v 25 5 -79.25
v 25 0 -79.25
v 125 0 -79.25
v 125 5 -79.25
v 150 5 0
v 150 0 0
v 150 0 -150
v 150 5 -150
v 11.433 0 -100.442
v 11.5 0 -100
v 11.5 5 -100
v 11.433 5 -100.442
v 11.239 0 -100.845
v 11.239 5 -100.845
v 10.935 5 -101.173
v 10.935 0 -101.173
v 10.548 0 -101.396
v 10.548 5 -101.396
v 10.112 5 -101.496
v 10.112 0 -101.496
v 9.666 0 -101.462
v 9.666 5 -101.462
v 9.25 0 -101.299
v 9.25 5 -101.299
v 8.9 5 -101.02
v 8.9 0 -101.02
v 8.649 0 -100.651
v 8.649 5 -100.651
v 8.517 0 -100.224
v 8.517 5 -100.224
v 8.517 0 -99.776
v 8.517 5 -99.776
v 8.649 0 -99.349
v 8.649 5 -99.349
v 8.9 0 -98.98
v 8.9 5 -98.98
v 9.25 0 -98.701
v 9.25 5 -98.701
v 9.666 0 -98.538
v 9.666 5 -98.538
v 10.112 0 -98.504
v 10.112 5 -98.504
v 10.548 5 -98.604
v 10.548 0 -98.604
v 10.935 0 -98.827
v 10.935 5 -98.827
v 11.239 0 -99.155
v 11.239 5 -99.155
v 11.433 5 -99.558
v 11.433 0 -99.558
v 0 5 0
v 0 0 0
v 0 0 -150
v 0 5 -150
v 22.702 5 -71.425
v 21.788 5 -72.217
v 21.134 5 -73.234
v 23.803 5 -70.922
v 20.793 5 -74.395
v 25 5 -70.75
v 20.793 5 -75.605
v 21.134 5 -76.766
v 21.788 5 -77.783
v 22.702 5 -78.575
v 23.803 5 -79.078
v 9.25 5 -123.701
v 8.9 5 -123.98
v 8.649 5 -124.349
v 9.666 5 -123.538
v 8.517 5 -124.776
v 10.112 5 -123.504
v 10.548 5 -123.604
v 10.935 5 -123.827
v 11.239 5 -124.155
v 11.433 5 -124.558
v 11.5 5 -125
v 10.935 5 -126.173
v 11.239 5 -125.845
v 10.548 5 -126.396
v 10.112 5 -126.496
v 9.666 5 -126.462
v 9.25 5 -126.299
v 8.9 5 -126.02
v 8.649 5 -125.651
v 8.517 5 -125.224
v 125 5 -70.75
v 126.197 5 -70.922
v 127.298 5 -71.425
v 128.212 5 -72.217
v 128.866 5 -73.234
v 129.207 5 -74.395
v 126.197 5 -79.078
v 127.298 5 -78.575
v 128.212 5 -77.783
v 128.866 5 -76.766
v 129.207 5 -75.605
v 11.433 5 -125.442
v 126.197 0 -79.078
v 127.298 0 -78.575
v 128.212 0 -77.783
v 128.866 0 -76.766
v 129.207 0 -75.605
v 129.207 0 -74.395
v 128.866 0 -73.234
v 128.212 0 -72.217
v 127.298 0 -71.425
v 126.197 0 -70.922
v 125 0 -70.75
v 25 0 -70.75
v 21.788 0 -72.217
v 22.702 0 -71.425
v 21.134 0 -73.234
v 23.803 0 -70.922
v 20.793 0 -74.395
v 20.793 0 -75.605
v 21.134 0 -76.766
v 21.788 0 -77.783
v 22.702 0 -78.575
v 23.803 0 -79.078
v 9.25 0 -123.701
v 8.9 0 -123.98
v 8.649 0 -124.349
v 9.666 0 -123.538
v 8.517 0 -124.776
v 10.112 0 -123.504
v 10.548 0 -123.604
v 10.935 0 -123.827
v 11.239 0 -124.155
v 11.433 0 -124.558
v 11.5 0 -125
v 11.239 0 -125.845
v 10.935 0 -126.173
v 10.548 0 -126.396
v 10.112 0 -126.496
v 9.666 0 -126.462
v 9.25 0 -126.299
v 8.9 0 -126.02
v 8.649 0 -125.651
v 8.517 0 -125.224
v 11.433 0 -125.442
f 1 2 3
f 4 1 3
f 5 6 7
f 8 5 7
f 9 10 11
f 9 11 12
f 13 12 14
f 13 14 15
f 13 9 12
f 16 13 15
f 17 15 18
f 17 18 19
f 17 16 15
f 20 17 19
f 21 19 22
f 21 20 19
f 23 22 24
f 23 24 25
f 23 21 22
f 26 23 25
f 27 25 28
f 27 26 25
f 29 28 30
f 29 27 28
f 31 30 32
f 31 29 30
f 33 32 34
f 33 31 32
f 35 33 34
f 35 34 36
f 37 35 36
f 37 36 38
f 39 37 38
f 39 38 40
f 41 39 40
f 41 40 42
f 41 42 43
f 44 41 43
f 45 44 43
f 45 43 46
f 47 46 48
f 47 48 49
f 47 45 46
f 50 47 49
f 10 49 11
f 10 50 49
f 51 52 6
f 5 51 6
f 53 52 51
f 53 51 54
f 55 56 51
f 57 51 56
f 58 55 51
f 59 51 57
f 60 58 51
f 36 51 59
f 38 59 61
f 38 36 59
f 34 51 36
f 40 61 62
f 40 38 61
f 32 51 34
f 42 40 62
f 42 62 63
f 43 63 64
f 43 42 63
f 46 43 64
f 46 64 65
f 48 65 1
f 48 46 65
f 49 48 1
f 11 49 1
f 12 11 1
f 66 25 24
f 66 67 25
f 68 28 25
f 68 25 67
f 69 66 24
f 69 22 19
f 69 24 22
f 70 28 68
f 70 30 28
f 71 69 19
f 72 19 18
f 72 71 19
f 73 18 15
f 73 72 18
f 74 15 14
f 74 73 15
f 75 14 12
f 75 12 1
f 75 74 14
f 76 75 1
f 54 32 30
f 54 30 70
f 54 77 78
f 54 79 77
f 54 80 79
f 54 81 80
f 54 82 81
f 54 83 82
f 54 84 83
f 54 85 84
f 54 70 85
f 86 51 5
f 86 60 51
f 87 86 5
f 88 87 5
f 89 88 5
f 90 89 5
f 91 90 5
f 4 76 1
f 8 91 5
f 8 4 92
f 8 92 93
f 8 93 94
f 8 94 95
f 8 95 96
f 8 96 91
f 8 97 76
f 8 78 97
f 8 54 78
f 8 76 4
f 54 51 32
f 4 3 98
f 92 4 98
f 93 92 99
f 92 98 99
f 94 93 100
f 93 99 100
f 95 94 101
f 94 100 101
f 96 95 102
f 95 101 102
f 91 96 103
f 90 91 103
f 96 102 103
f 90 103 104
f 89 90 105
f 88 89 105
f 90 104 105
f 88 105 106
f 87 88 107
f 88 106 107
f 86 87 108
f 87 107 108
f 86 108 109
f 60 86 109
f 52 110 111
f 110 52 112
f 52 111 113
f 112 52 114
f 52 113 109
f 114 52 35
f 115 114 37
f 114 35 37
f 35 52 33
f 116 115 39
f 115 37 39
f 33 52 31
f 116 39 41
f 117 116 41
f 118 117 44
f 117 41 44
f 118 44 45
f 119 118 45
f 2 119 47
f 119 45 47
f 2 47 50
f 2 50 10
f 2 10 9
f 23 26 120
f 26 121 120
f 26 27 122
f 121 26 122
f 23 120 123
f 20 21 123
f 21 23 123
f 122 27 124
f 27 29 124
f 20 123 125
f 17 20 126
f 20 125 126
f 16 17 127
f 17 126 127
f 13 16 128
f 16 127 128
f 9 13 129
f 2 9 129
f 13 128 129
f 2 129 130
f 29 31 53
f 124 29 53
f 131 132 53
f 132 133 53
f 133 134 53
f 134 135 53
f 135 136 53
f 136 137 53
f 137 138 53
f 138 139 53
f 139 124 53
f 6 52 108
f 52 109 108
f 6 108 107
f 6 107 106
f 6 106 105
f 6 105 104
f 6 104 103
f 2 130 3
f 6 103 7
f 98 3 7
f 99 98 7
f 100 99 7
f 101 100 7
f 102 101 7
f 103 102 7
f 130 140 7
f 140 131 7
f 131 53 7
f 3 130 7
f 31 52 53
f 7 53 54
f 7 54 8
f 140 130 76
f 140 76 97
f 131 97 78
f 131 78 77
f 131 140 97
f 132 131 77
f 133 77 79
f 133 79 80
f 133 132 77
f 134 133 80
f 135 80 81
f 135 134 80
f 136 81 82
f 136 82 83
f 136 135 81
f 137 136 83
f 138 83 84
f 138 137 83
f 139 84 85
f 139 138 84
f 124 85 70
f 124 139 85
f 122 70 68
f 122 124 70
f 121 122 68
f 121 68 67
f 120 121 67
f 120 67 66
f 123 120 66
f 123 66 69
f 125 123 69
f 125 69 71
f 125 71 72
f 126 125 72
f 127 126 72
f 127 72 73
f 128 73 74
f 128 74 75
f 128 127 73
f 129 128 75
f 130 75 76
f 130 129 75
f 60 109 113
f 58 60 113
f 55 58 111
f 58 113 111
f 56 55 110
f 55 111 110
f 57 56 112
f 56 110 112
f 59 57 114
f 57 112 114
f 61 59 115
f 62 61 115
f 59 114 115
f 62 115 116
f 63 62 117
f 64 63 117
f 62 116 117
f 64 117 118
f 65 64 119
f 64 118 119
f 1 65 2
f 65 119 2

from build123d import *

# Parameters (mm, degrees)
SKETCH1_W           = 150
SKETCH1_H           = 150
SKETCH1_R           = 1.5
BOSS_EXTRUDE1_DEPTH = 5


with BuildPart() as part:
    # Sketch1 → Boss-Extrude1 (new body)
    with BuildSketch(Plane(origin=(0, 0, 0), x_dir=(1, 0, 0), z_dir=(0, 1, 0))):
        with Locations((75, 75)):
            Rectangle(SKETCH1_W, SKETCH1_H)
        with Locations((10, 125)):
            Circle(SKETCH1_R, mode=Mode.SUBTRACT)
        with Locations((10, 100)):
            Circle(SKETCH1_R, mode=Mode.SUBTRACT)
        with BuildLine():
            Line((25, 79.25), (125, 79.25))
            ThreePointArc((125, 79.25), (129.25, 75), (125, 70.75))
            Line((125, 70.75), (25, 70.75))
            ThreePointArc((25, 70.75), (20.75, 75), (25, 79.25))
        make_face(mode=Mode.SUBTRACT)
    extrude(amount=BOSS_EXTRUDE1_DEPTH)


solid = part.part
